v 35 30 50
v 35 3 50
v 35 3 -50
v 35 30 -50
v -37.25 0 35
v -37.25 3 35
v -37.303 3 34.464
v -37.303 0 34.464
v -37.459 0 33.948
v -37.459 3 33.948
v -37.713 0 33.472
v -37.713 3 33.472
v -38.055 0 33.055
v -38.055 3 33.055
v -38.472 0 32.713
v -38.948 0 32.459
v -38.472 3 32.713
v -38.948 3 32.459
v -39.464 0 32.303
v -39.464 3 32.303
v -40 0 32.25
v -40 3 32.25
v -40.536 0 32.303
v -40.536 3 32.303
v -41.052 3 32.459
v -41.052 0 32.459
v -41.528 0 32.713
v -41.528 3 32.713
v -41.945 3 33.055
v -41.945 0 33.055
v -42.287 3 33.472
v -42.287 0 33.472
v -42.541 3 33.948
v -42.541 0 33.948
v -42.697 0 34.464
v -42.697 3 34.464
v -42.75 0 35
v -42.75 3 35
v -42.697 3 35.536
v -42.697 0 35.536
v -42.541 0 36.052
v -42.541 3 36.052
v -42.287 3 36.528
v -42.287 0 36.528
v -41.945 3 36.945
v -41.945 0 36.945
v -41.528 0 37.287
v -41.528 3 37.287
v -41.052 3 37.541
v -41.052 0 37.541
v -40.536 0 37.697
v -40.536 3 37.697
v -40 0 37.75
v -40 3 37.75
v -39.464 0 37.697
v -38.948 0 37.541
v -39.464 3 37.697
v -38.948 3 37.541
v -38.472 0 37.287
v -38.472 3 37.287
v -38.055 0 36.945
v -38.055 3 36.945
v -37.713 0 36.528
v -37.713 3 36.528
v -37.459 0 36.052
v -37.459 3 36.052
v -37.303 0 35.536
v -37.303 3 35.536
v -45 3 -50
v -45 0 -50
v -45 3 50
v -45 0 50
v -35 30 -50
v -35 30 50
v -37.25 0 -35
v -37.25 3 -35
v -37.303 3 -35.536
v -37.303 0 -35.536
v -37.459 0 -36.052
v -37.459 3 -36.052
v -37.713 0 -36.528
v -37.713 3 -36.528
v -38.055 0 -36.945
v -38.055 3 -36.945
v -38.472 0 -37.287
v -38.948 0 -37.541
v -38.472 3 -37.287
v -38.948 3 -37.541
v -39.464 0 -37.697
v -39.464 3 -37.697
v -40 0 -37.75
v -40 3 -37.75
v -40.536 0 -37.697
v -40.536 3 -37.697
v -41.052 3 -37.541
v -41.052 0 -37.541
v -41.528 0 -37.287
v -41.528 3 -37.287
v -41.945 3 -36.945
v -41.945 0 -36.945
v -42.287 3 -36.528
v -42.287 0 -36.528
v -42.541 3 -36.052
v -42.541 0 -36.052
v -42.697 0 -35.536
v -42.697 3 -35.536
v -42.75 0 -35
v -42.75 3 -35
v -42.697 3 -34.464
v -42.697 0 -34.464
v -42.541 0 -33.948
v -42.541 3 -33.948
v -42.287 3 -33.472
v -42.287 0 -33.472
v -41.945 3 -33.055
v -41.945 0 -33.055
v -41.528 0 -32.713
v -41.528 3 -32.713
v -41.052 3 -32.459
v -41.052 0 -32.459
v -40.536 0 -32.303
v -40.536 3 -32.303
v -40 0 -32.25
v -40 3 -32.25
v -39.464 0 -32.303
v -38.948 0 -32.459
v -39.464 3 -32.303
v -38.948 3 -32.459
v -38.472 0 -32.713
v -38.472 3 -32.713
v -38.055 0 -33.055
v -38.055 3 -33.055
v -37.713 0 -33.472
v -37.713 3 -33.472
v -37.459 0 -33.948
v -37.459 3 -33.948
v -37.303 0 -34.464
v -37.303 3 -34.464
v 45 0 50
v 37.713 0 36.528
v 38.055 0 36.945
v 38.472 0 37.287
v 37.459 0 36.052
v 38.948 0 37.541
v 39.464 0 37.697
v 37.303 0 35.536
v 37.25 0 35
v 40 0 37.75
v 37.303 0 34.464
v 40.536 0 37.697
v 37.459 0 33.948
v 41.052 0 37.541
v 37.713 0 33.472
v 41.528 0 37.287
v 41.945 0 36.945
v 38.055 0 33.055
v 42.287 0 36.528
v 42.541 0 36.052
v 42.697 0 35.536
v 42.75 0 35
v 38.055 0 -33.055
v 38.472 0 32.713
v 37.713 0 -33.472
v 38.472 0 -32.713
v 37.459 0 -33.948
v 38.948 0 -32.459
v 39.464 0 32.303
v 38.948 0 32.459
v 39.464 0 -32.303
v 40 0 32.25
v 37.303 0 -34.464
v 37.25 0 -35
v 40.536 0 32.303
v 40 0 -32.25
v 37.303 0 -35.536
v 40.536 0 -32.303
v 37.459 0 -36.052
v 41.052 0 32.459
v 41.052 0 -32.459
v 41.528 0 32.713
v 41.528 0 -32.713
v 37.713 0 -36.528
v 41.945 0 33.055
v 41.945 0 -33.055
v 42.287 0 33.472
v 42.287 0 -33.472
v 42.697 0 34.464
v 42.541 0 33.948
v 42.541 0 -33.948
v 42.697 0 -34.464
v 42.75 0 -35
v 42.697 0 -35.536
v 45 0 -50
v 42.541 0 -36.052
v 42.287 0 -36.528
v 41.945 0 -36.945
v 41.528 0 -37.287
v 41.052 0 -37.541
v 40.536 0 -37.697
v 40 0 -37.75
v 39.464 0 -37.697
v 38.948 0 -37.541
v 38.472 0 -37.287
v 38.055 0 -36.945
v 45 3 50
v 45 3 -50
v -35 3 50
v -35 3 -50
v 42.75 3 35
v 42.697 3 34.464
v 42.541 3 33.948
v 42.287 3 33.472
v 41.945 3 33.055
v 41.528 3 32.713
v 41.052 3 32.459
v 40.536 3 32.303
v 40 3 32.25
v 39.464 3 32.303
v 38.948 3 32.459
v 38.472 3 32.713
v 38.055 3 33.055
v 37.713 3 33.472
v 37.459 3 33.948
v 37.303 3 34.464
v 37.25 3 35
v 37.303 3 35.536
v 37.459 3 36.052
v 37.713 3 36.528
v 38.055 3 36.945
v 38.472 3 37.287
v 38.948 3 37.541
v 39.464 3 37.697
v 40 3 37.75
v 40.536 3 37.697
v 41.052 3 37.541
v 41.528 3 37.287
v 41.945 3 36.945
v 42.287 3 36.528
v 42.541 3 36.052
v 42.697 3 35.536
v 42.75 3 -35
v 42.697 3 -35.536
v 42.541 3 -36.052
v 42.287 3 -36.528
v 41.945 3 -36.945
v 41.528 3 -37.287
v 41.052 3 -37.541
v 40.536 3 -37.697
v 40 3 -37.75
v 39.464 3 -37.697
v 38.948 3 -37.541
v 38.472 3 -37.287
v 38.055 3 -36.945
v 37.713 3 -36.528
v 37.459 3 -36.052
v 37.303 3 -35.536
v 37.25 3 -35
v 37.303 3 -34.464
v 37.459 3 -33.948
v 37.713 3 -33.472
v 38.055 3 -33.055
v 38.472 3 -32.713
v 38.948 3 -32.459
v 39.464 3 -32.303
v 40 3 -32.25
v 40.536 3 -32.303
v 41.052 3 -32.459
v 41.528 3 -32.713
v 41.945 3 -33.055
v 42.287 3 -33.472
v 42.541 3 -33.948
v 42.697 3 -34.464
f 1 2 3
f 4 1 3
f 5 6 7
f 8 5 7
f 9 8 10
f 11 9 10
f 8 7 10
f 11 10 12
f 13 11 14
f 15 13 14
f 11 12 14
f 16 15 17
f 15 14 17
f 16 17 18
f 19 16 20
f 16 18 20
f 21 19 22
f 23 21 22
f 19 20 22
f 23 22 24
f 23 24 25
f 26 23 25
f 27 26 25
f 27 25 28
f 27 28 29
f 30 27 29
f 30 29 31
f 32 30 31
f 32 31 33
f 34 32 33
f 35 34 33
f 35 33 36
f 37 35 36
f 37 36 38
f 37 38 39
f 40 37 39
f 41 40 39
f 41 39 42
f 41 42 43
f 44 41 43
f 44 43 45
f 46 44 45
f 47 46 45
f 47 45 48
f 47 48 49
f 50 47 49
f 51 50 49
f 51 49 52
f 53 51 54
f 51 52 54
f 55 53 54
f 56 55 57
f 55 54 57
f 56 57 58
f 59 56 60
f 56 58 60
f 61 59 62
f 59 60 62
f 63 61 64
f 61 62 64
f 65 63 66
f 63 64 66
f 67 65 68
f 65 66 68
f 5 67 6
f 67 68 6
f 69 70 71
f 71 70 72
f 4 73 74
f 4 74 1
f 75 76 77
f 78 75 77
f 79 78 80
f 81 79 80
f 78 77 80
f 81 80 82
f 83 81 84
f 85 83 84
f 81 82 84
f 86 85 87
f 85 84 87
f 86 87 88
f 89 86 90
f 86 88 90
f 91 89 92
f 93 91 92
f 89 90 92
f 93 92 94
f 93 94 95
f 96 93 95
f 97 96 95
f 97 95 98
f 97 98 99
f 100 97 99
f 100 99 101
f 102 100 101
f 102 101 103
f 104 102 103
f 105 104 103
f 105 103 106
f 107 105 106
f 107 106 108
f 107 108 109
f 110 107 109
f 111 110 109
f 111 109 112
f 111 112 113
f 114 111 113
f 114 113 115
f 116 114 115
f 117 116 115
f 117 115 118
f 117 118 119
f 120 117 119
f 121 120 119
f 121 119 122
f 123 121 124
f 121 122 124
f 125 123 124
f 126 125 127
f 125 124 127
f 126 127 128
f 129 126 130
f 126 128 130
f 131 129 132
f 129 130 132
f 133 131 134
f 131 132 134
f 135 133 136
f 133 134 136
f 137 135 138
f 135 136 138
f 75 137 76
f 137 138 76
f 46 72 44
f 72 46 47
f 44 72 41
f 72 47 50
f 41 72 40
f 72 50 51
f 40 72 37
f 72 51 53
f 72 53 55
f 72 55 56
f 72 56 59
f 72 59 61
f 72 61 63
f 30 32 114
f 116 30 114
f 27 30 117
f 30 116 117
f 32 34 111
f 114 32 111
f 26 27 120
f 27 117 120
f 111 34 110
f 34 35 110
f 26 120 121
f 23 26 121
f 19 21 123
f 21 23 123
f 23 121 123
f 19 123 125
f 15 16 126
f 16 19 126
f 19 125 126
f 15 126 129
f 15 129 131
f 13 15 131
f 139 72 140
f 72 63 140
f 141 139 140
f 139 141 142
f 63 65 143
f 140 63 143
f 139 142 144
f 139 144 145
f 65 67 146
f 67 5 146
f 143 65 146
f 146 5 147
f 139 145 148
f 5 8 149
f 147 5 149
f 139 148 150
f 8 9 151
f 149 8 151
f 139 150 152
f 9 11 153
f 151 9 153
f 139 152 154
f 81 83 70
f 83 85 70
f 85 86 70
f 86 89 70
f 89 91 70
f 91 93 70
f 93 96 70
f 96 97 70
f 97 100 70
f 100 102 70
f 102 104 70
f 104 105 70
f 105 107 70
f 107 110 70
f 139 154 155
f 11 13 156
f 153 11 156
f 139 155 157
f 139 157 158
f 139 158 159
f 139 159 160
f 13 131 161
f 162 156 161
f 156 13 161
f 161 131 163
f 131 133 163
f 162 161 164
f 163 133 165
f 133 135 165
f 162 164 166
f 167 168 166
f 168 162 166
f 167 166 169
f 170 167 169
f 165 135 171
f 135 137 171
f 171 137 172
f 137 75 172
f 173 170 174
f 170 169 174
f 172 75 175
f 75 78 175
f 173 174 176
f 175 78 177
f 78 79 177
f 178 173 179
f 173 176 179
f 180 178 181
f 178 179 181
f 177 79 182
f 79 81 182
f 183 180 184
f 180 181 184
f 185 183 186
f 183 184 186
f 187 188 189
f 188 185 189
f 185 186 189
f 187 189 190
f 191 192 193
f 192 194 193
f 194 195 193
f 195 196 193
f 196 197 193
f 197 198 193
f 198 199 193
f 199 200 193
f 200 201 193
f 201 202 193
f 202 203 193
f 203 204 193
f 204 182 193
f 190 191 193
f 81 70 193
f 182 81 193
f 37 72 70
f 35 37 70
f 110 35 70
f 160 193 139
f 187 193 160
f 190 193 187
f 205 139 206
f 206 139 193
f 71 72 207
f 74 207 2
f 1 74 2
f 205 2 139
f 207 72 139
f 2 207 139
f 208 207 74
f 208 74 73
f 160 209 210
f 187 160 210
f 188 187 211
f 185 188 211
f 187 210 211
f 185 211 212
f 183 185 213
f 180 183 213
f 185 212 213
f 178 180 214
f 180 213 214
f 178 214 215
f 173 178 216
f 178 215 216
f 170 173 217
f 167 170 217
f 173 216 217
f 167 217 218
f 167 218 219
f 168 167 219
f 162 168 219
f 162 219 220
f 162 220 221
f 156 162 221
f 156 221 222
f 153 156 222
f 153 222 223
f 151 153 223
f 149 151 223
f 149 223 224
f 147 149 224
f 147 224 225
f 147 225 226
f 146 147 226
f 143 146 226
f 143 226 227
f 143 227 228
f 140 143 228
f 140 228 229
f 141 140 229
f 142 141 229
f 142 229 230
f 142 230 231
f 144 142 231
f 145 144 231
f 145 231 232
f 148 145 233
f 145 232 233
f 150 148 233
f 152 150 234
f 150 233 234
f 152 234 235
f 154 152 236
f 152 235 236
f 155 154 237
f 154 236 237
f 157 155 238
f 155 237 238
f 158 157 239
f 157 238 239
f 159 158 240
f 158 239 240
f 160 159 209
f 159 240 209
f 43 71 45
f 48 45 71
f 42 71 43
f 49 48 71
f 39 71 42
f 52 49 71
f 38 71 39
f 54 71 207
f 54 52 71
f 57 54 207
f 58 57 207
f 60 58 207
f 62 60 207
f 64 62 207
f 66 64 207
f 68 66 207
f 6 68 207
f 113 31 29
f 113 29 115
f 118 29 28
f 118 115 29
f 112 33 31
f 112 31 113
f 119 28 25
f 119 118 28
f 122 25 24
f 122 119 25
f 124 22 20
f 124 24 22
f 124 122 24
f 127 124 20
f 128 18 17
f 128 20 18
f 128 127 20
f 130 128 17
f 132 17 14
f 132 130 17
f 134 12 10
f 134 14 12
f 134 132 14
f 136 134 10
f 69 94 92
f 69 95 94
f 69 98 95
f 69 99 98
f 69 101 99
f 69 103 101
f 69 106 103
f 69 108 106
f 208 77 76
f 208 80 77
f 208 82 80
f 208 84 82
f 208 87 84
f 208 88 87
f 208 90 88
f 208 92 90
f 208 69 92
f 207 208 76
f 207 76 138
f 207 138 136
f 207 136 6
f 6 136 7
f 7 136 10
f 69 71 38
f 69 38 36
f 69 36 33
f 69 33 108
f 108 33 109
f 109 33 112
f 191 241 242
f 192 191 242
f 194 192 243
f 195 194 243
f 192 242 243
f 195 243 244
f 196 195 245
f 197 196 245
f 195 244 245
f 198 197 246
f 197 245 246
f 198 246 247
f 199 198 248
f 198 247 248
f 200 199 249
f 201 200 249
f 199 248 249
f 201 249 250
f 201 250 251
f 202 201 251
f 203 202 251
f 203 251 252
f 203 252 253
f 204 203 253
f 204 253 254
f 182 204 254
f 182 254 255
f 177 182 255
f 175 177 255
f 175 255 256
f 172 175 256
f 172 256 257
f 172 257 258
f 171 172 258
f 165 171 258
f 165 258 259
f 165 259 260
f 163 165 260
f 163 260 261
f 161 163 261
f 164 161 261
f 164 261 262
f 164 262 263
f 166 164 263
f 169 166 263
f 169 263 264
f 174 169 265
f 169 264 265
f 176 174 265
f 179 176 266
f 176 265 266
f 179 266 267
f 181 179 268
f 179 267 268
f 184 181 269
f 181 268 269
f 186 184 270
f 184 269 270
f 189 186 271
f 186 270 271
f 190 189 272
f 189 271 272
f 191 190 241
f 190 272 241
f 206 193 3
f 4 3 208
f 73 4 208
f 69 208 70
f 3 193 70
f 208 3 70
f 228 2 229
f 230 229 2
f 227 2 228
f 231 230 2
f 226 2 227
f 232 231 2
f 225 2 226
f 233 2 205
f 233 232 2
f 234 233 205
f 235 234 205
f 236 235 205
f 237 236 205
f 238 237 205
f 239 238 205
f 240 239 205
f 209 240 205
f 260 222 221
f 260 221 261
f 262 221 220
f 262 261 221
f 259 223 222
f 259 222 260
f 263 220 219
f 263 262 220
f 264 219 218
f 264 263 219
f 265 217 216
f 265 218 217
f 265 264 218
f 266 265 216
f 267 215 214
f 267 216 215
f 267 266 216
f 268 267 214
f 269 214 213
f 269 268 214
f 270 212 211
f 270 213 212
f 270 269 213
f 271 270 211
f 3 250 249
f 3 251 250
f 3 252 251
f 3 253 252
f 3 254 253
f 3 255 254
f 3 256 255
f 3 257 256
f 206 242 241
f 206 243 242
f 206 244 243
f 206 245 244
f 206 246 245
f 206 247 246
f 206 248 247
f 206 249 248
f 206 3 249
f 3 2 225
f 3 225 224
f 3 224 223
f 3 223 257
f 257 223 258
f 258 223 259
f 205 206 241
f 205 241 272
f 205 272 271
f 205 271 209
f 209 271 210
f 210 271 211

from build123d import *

# Parameters (mm, degrees)
SKETCH1_W                = 70
SKETCH1_H                = 100
BOSS_EXTRUDE1_DEPTH      = 30
BOSS_EXTRUDE3_DEPTH      = 3
M5_CLEARANCE_SLOT1_D     = 5.5
M5_CLEARANCE_SLOT1_DEPTH = 22.25
M5_CLEARANCE_SLOT1_TIP   = 1.652366702


with BuildPart() as part:
    # Sketch1 → Boss-Extrude1 (new body)
    with BuildSketch(Plane(origin=(0, 0, 0), x_dir=(1, 0, 0), z_dir=(0, 1, 0))):
        Rectangle(SKETCH1_W, SKETCH1_H)
    extrude(amount=BOSS_EXTRUDE1_DEPTH)

    # Sketch1<4> → Boss-Extrude3 (add)
    with BuildSketch(Plane(origin=(0, 0, 0), x_dir=(1, 0, 0), z_dir=(0, 1, 0))):
        Polygon((-35, -50), (-35, 50), (-45, 50), (-45, 35), (-45, -35), (-45, -50), align=None)
        Polygon((45, 35), (45, 50), (35, 50), (35, -50), (45, -50), (45, -35), align=None)
    extrude(amount=BOSS_EXTRUDE3_DEPTH)

    # M5 Clearance Slot1
    with Locations(Plane(origin=(0, 0, 0), x_dir=(-1, 0, 0), z_dir=(0, -1, 0))):
        with Locations((40, 35), (40, -35), (-40, 35), (-40, -35)):
            Hole(M5_CLEARANCE_SLOT1_D / 2, depth=M5_CLEARANCE_SLOT1_DEPTH)
            with Locations((0, 0, -(M5_CLEARANCE_SLOT1_DEPTH + M5_CLEARANCE_SLOT1_TIP / 2))):  # 118° drill point
                Cone(0, M5_CLEARANCE_SLOT1_D / 2, M5_CLEARANCE_SLOT1_TIP, mode=Mode.SUBTRACT)


solid = part.part
